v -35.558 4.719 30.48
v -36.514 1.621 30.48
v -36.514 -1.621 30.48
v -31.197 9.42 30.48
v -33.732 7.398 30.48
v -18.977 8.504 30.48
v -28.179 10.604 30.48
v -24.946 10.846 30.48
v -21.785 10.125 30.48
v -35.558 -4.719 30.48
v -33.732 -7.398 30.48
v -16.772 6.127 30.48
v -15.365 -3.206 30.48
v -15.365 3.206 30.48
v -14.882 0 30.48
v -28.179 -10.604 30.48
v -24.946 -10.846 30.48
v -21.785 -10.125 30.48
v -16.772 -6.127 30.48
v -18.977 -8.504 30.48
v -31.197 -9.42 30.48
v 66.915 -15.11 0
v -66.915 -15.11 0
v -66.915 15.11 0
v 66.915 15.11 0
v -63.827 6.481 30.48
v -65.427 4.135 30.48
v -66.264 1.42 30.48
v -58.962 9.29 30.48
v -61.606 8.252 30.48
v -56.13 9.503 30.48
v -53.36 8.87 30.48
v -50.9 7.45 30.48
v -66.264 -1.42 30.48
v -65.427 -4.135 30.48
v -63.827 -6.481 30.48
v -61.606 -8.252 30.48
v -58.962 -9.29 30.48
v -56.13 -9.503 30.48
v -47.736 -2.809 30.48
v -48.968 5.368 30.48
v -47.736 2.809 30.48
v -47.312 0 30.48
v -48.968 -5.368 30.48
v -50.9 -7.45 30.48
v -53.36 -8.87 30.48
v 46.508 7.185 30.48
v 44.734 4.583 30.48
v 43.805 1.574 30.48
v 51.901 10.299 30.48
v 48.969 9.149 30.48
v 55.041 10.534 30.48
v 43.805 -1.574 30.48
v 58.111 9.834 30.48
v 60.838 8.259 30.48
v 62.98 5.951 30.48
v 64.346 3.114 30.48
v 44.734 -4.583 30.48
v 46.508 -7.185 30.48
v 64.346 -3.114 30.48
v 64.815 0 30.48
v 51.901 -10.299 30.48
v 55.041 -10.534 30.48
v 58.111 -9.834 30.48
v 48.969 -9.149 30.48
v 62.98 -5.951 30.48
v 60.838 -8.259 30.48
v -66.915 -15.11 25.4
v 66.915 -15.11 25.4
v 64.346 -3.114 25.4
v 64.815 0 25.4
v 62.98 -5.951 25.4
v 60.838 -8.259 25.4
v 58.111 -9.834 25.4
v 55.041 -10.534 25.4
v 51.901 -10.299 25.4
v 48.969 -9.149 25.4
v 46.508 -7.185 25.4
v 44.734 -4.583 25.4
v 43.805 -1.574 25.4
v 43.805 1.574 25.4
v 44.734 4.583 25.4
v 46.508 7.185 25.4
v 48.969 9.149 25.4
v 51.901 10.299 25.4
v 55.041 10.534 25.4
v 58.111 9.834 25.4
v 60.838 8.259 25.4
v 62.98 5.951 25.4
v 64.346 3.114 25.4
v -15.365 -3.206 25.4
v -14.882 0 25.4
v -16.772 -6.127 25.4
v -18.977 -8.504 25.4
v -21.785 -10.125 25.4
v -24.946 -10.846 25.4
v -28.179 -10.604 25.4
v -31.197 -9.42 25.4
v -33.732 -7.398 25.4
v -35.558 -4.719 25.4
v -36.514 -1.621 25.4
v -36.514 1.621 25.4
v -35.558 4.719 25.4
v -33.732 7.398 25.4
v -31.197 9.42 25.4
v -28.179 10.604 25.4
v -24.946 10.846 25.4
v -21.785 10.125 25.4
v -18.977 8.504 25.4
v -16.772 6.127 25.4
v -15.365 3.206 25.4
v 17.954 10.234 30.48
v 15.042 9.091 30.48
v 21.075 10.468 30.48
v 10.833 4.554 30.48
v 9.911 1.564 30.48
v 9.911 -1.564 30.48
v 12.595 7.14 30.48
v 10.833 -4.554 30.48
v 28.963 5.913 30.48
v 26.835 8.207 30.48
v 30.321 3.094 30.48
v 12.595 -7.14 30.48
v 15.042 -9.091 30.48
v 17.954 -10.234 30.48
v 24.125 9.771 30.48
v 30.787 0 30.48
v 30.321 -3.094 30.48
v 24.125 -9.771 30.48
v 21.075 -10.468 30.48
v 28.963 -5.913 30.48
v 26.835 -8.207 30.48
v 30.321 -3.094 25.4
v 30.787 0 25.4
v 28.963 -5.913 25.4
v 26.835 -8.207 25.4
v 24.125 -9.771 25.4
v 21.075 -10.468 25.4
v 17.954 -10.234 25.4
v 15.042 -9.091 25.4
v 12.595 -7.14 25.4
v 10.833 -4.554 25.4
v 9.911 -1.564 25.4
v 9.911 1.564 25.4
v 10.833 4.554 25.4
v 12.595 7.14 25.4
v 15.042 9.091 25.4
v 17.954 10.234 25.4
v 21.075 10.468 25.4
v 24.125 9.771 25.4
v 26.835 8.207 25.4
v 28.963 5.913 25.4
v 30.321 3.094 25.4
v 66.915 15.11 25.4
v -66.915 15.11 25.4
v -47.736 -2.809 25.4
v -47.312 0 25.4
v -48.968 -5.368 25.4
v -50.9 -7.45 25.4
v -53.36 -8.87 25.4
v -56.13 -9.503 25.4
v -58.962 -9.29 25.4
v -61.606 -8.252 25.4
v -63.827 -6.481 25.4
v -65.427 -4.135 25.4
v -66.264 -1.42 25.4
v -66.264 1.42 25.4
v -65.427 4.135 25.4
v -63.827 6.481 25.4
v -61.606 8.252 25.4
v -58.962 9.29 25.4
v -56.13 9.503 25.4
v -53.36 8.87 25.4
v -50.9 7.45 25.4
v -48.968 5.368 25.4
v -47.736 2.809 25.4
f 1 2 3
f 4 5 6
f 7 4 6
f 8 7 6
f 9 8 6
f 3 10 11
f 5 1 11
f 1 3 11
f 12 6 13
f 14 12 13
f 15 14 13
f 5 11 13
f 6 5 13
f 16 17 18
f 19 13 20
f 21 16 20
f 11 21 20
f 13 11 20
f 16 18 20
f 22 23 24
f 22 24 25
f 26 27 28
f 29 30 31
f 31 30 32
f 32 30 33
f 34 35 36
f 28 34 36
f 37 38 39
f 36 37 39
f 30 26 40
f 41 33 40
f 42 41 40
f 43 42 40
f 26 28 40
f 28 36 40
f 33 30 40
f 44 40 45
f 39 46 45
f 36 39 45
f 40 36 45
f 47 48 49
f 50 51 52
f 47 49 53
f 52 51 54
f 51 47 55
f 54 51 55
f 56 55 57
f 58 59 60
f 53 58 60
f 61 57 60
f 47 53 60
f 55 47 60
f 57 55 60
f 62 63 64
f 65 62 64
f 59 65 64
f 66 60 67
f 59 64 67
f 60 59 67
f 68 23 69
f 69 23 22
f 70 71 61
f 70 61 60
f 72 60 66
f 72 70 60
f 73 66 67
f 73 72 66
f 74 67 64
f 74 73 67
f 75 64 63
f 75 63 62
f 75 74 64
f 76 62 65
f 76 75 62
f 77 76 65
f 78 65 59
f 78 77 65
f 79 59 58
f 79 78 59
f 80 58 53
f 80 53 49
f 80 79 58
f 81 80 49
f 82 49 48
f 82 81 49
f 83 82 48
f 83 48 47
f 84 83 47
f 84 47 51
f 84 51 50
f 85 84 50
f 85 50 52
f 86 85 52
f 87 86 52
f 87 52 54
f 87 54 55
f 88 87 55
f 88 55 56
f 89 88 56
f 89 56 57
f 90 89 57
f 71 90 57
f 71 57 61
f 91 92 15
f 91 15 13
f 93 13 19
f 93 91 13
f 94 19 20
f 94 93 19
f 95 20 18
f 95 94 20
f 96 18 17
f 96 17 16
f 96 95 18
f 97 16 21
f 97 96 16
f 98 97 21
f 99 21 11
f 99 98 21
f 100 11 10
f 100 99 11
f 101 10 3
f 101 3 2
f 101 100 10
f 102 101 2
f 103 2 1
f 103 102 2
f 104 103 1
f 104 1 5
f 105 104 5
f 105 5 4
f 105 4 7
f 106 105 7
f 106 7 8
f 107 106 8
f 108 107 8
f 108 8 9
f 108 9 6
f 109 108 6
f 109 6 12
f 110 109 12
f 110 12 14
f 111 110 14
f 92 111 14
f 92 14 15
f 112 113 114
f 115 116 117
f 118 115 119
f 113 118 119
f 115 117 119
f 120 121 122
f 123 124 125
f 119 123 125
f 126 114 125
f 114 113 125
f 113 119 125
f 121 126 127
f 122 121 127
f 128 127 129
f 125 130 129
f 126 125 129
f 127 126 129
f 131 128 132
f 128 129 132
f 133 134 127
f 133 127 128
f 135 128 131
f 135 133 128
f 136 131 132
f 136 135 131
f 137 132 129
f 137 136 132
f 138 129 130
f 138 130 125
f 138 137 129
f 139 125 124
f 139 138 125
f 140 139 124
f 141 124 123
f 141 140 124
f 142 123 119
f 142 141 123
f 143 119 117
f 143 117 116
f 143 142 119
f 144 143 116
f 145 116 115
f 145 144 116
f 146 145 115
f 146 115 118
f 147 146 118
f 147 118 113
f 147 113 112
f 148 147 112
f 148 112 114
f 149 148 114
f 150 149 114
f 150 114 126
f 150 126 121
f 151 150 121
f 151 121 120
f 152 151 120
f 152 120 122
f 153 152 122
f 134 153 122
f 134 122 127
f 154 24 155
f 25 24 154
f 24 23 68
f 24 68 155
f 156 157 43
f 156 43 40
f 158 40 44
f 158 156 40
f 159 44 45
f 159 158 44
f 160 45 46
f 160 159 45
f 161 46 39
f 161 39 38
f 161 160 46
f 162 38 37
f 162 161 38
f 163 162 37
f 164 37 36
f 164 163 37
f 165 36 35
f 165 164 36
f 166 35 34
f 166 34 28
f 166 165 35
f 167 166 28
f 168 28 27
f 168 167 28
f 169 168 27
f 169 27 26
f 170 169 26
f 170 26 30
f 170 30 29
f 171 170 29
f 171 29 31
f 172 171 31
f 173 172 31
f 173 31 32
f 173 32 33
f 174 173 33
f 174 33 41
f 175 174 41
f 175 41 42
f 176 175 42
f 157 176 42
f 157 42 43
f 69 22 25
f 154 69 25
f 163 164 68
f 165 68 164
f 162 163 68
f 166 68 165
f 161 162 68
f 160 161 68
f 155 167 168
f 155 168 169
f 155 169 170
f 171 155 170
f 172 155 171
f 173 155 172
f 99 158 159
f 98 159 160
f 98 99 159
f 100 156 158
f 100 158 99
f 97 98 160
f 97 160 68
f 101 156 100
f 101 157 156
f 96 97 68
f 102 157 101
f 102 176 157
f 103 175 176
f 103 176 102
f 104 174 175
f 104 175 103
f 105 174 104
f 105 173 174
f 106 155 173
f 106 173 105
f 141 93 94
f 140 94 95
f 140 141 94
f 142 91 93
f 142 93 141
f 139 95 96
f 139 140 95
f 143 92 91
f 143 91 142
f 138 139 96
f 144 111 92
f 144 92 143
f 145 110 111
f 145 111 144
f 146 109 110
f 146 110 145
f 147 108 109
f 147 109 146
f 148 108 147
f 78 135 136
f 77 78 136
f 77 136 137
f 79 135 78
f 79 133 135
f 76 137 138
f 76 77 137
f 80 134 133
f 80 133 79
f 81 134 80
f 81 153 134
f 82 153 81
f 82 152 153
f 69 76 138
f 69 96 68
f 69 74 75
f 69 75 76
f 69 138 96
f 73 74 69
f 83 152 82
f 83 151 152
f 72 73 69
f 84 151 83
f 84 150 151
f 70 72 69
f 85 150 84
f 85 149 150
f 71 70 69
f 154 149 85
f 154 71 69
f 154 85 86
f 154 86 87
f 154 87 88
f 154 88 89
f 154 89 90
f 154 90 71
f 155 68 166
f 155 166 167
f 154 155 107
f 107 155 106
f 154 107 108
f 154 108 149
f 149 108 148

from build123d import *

# Parameters (mm, degrees)
F0_W     = 133.8296830654
F0_H     = 30.2196051925
F0_R     = 12.6806101672
F0_R_2   = 13.1338475118
F0_R_3   = 13.2147961645
F1_DEPTH = 25.4
F2_R     = 9.5291524703
F2_R_2   = 10.876810803
F2_R_3   = 10.4970200843
F2_R_4   = 10.5638834355
F3_DEPTH = 30.48


with BuildPart() as f1:
    # F0 (on Top) → F1 (new body)
    with BuildSketch(Plane.XY):
        Rectangle(F0_W, F0_H)
        with Locations((-49.6464930475, 0)):
            Circle(F0_R, mode=Mode.SUBTRACT)
        Circle(F0_R_2, mode=Mode.SUBTRACT)
        with Locations((45.0416021049, 0)):
            Circle(F0_R_3, mode=Mode.SUBTRACT)
        with Locations((45.0416021049, 0)):
            Circle(F0_R_3)
        Circle(F0_R_2)
        with Locations((-49.6464930475, 0)):
            Circle(F0_R)
    extrude(amount=F1_DEPTH)

    # F2 (on face) → F3 (join)
    with BuildSketch(Plane(origin=(0, 0, 0), x_dir=(1, 0, 0), z_dir=(0, 0, -1))):
        with Locations((-56.8416379392, 0)):
            Circle(F2_R)
        with Locations((-25.7586147636, 0)):
            Circle(F2_R_2)
        with Locations((20.290305838, 0)):
            Circle(F2_R_3)
        with Locations((54.25138399, 0)):
            Circle(F2_R_4)
    extrude(amount=-F3_DEPTH)


solid = f1.part
